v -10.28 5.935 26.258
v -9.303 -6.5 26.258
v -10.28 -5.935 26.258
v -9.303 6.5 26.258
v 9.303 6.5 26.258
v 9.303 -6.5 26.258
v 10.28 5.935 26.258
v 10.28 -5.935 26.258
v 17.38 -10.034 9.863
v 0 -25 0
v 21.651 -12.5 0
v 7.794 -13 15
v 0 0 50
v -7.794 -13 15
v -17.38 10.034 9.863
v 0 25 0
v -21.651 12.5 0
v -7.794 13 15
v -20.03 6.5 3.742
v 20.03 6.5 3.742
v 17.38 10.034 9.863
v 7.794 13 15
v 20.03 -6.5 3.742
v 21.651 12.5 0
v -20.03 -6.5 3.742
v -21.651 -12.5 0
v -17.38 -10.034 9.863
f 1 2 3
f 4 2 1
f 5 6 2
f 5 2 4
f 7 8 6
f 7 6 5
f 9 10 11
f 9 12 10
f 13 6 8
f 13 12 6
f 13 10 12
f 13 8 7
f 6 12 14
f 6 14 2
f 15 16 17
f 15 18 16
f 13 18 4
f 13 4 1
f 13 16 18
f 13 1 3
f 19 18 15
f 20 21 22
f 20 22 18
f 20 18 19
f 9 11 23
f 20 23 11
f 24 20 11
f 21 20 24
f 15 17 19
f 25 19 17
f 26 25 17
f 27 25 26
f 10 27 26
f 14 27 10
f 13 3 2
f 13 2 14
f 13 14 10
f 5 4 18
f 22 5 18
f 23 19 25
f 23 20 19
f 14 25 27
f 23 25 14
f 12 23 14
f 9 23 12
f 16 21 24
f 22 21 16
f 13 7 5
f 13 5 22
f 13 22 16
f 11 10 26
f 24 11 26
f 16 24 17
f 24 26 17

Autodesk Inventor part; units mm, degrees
ref_plane "XZ Plane" through (0, 0, 0) normal (0, 1, 0) x (-1, 0, 0)
sketch "Эскиз1" plane through (0, 0, 0) normal (0, 0, 1) x (1, 0, 0)
  line L0 (0, -25) -> (-21.6506, -12.5)
  line L1 (-21.6506, -12.5) -> (-21.6506, 12.5)
  line L2 (-21.6506, 12.5) -> (0, 25)
  line L3 (0, 25) -> (21.6506, 12.5)
  line L4 (21.6506, 12.5) -> (21.6506, -12.5)
  line L5 (21.6506, -12.5) -> (0, -25)
  point P0 (0, 0)
  point P1 (0, 0)
ref_plane "РабПлоскость1" through (0, 0, 50) normal (0, 0, 1) x (1, 0, 0)
sketch "Эскиз2" plane through (0, 0, 50) normal (0, 0, 1) x (1, 0, 0)
  point P0 (0, 0)
  point P1 (0, 0)
loft "Лофт1" add profiles "Эскиз1" section 2 point at (0, 0, 50)
ref_plane "РабПлоскость2" through (25, 0, 0) normal (1, 0, 0) x (0, 1, 0)
sketch "Эскиз3" plane through (25, 0, 0) normal (1, 0, 0) x (0, 1, 0)
  line L0 (25, 0) -> (0, 50) projected
  line L1 (13, 15) -> (6.5, 3.7417)
  line L2 (6.5, 3.7417) -> (-6.5, 3.7417)
  line L3 (-6.5, 3.7417) -> (-13, 15)
  line L4 (-13, 15) -> (-6.5, 26.2583)
  line L5 (-6.5, 26.2583) -> (6.5, 26.2583)
  line L6 (6.5, 26.2583) -> (13, 15)
  point P0 (0, 0)
  point P1 (0, 15)
extrude "Выдавливание1" cut sketch "Эскиз3" against normal blind 50
properties part number "пирамида"
